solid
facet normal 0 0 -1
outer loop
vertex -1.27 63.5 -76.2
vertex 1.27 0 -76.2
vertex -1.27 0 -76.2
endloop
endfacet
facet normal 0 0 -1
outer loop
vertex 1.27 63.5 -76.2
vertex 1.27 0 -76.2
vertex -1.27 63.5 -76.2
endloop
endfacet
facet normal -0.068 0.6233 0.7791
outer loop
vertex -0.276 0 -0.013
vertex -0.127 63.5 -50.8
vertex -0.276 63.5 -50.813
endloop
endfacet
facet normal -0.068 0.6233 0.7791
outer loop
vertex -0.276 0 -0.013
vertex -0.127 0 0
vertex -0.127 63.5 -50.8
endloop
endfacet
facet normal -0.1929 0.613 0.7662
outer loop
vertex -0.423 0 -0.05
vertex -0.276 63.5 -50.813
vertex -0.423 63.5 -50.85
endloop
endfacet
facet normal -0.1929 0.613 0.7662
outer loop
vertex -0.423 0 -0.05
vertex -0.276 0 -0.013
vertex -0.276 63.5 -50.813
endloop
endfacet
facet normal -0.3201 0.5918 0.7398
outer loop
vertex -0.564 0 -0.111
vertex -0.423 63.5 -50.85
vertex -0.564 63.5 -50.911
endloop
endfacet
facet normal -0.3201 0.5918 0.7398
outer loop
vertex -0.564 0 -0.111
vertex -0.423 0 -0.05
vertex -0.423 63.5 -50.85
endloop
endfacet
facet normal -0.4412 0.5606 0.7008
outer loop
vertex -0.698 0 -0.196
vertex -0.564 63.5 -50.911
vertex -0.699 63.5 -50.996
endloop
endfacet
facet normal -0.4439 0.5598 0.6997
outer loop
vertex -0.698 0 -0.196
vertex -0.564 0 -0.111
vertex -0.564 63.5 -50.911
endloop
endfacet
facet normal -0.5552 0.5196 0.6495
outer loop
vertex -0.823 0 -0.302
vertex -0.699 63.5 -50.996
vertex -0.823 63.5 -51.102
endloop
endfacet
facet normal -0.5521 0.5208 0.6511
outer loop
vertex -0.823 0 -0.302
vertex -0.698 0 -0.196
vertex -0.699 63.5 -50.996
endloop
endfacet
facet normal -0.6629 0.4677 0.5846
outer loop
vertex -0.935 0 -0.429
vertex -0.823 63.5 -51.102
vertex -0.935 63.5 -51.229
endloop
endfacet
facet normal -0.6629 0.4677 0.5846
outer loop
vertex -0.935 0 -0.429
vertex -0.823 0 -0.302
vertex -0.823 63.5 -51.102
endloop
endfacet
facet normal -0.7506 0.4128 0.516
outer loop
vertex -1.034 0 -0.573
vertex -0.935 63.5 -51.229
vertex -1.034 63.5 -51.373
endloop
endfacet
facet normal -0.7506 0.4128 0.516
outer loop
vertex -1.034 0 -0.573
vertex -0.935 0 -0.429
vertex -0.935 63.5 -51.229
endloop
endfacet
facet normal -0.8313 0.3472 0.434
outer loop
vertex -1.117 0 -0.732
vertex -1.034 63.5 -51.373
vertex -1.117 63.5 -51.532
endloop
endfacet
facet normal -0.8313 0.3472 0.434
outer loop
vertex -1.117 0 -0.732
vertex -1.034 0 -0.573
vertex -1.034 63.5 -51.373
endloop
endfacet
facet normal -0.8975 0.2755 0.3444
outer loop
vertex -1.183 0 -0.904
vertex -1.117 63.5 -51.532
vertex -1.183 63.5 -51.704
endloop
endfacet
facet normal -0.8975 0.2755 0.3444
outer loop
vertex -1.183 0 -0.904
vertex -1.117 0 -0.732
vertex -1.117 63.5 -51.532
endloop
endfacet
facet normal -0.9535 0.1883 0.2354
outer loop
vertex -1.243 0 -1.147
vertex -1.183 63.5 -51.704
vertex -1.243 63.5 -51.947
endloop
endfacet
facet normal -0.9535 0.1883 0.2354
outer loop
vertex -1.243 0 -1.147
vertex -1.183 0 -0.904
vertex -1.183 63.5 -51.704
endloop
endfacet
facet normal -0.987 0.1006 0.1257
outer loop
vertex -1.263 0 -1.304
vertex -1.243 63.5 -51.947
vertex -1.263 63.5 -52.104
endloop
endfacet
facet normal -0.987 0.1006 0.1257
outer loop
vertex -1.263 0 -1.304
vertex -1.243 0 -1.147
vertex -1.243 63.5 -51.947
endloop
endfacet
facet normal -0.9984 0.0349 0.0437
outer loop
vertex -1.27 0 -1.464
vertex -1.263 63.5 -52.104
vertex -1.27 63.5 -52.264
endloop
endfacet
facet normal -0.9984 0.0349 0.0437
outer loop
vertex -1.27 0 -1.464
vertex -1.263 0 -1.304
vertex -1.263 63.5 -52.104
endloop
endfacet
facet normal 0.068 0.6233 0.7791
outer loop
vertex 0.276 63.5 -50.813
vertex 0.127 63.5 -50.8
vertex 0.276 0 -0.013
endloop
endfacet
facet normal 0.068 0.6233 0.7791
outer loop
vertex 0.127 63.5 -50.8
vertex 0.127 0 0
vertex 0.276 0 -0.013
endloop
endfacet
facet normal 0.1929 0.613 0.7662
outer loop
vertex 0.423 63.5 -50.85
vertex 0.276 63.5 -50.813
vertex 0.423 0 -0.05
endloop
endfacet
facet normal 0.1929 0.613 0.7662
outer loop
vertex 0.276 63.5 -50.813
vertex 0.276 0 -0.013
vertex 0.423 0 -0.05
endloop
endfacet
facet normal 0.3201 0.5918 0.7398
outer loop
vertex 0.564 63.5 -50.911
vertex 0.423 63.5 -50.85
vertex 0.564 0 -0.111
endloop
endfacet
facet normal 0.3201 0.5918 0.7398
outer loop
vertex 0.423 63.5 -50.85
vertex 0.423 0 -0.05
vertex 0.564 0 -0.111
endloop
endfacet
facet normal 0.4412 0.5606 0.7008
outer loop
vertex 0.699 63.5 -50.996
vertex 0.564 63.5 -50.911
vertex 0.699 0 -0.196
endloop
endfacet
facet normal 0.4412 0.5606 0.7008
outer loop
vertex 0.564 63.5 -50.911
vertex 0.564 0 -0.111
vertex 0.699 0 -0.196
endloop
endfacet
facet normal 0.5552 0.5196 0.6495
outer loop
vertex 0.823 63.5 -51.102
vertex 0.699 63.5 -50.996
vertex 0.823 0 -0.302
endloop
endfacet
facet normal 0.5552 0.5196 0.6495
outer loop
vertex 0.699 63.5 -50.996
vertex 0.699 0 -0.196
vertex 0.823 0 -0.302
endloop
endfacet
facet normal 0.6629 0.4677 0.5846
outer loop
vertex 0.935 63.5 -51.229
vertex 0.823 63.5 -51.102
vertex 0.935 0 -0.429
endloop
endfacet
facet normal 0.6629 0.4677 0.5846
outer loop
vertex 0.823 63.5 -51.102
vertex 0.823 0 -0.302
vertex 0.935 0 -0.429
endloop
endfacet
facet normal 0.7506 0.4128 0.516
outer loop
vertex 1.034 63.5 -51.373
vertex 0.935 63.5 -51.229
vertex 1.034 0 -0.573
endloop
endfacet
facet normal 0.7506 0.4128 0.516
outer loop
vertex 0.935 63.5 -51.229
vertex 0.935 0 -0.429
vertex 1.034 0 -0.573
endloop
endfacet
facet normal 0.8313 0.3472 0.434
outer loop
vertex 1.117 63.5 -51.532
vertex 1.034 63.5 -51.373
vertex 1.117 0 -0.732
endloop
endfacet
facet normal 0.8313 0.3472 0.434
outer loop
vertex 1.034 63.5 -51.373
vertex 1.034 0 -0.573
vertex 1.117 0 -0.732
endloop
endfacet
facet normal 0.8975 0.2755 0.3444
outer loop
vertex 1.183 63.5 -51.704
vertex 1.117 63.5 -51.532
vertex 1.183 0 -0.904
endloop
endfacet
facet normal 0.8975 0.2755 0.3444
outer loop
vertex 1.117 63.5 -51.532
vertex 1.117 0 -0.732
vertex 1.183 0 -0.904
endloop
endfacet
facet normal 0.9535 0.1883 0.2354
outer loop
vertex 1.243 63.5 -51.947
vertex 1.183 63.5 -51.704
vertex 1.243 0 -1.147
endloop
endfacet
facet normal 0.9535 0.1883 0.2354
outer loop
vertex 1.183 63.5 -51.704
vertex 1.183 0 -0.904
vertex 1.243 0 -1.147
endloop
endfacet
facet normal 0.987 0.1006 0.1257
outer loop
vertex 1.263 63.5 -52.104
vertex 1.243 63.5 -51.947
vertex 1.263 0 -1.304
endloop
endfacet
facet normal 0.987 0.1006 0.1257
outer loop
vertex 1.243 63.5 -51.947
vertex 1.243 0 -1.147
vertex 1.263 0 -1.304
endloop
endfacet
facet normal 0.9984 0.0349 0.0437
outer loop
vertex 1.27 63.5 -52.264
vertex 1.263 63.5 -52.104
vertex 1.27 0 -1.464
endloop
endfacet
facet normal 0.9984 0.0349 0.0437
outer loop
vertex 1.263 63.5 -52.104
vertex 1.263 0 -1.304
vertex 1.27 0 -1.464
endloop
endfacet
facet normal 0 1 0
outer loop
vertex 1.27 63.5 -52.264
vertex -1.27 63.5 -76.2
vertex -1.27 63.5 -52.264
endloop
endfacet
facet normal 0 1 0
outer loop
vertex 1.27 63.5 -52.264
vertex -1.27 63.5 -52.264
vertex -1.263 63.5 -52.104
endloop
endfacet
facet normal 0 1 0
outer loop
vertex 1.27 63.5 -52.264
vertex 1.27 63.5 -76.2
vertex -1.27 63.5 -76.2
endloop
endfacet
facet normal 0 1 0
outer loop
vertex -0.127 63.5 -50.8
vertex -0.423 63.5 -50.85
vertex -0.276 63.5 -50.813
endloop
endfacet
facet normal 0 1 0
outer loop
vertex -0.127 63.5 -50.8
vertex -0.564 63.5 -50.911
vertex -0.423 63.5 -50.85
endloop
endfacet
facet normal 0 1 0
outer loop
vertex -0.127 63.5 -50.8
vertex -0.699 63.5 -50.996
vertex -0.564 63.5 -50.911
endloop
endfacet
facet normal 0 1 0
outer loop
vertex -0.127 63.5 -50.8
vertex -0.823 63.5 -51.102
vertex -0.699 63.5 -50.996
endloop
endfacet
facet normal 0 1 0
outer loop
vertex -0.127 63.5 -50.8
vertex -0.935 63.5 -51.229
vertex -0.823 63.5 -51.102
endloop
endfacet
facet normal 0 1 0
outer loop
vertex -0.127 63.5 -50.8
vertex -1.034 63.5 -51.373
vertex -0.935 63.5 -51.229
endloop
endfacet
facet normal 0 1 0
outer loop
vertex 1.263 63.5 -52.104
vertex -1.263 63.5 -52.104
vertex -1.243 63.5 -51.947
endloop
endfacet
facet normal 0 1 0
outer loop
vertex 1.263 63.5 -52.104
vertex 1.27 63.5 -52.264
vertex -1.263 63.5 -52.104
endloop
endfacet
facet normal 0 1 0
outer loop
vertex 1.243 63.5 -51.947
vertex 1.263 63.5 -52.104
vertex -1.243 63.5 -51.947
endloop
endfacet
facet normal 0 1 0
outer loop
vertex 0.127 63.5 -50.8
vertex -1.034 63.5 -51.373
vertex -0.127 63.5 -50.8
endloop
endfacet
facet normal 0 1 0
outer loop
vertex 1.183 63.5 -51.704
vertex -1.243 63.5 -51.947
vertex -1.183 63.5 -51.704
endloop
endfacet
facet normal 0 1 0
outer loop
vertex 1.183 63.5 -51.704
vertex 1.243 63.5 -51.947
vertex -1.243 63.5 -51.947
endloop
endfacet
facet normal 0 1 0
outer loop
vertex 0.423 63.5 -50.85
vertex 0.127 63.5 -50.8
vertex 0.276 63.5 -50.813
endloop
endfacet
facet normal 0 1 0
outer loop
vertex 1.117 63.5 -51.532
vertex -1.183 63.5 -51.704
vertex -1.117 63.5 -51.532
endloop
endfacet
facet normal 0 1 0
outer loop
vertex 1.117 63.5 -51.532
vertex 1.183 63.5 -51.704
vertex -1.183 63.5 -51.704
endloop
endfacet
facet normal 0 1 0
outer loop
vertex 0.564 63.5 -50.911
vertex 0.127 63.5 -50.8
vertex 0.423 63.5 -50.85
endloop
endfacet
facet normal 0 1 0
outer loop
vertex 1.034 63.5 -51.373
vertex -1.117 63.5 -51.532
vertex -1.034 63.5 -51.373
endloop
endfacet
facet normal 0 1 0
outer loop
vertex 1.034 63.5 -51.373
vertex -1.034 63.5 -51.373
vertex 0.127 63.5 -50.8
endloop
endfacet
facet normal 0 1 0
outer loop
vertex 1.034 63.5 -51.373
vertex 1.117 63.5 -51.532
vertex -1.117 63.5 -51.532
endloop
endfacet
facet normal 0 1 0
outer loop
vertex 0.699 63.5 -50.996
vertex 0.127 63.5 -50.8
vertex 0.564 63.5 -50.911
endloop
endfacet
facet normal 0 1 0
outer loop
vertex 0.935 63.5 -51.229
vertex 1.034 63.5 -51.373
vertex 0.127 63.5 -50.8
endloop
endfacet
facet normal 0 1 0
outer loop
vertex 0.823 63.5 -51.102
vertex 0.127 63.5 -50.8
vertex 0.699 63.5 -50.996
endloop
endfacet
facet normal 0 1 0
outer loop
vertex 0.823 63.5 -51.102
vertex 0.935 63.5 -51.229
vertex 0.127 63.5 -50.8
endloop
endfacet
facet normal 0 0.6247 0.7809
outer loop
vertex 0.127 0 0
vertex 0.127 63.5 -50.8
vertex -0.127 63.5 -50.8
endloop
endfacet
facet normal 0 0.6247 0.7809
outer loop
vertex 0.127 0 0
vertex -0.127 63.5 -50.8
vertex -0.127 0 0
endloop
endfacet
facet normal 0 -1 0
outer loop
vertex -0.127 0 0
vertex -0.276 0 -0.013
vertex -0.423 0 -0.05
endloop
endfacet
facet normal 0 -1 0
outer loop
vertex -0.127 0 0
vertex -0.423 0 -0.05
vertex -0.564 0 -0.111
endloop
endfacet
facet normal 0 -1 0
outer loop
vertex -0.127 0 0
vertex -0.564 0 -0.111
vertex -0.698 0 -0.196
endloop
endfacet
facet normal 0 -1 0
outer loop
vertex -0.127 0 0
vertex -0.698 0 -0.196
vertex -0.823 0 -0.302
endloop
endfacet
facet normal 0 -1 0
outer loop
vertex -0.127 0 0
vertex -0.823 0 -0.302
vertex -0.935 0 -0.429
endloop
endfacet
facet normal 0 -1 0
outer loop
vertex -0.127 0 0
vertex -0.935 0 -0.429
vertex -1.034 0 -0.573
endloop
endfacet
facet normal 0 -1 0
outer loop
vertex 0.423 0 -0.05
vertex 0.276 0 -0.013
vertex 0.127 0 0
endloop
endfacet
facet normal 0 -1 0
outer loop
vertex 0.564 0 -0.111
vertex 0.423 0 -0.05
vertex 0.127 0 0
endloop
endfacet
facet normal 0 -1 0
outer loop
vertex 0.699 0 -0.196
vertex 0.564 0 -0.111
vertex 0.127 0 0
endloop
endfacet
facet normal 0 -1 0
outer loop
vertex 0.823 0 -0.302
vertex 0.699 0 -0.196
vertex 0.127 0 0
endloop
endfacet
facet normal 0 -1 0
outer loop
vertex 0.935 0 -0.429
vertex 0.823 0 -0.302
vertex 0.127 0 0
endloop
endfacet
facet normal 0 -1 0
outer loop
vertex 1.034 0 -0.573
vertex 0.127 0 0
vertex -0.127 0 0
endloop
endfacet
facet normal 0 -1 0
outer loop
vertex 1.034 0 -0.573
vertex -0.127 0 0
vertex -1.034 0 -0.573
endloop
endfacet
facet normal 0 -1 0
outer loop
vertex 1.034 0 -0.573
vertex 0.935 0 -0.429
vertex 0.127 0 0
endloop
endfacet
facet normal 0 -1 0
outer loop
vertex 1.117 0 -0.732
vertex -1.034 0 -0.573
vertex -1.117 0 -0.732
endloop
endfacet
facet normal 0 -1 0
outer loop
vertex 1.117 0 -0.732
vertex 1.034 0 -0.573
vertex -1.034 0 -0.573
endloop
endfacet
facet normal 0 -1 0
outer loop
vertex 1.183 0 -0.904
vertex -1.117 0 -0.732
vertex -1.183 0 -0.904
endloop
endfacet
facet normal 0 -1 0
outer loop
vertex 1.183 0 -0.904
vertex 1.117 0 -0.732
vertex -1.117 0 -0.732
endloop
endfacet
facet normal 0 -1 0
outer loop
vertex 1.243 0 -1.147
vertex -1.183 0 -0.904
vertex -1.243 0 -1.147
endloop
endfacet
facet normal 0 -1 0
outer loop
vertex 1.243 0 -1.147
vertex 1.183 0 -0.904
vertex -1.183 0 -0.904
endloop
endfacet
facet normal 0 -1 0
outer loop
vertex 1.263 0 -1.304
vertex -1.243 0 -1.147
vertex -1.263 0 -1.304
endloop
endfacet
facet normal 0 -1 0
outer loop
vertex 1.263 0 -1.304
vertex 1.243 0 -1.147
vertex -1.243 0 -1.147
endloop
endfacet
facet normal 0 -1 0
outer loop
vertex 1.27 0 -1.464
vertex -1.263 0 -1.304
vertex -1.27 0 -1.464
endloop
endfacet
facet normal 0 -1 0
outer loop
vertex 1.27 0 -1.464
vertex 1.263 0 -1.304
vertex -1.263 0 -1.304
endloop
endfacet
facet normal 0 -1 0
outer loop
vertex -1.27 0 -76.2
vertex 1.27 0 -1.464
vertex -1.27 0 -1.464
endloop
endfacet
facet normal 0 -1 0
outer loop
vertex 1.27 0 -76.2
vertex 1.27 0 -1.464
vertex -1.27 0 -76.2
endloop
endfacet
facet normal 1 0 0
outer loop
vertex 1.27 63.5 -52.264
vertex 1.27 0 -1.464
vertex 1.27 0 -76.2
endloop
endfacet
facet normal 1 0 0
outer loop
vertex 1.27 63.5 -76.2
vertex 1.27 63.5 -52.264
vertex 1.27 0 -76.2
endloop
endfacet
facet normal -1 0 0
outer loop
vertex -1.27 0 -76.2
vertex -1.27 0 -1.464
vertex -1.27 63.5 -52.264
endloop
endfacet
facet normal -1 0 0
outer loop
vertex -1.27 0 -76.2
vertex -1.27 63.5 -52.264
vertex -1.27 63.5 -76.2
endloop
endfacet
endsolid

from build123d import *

# Parameters (mm, degrees)
BOSS_EXTRUDE1_DEPTH = 1.27
FILLET1_R           = 1.143


with BuildPart() as part:
    # Sketch1 → Boss-Extrude1 (new body, symmetric)
    with BuildSketch(Plane(origin=(0, 0, 0), x_dir=(0, 0, -1), z_dir=(1, 0, 0))):
        Polygon((0, 0), (76.2, 0), (76.2, 63.5), (50.8, 63.5), align=None)
    extrude(amount=BOSS_EXTRUDE1_DEPTH, both=True)

    # Fillet1
    fillet1_edges = [part.edges().sort_by_distance(p)[0] for p in [
        (1.27, 31.75, -25.4),
        (-1.27, 31.75, -25.4),
    ]]
    fillet(fillet1_edges, radius=FILLET1_R)


solid = part.part
